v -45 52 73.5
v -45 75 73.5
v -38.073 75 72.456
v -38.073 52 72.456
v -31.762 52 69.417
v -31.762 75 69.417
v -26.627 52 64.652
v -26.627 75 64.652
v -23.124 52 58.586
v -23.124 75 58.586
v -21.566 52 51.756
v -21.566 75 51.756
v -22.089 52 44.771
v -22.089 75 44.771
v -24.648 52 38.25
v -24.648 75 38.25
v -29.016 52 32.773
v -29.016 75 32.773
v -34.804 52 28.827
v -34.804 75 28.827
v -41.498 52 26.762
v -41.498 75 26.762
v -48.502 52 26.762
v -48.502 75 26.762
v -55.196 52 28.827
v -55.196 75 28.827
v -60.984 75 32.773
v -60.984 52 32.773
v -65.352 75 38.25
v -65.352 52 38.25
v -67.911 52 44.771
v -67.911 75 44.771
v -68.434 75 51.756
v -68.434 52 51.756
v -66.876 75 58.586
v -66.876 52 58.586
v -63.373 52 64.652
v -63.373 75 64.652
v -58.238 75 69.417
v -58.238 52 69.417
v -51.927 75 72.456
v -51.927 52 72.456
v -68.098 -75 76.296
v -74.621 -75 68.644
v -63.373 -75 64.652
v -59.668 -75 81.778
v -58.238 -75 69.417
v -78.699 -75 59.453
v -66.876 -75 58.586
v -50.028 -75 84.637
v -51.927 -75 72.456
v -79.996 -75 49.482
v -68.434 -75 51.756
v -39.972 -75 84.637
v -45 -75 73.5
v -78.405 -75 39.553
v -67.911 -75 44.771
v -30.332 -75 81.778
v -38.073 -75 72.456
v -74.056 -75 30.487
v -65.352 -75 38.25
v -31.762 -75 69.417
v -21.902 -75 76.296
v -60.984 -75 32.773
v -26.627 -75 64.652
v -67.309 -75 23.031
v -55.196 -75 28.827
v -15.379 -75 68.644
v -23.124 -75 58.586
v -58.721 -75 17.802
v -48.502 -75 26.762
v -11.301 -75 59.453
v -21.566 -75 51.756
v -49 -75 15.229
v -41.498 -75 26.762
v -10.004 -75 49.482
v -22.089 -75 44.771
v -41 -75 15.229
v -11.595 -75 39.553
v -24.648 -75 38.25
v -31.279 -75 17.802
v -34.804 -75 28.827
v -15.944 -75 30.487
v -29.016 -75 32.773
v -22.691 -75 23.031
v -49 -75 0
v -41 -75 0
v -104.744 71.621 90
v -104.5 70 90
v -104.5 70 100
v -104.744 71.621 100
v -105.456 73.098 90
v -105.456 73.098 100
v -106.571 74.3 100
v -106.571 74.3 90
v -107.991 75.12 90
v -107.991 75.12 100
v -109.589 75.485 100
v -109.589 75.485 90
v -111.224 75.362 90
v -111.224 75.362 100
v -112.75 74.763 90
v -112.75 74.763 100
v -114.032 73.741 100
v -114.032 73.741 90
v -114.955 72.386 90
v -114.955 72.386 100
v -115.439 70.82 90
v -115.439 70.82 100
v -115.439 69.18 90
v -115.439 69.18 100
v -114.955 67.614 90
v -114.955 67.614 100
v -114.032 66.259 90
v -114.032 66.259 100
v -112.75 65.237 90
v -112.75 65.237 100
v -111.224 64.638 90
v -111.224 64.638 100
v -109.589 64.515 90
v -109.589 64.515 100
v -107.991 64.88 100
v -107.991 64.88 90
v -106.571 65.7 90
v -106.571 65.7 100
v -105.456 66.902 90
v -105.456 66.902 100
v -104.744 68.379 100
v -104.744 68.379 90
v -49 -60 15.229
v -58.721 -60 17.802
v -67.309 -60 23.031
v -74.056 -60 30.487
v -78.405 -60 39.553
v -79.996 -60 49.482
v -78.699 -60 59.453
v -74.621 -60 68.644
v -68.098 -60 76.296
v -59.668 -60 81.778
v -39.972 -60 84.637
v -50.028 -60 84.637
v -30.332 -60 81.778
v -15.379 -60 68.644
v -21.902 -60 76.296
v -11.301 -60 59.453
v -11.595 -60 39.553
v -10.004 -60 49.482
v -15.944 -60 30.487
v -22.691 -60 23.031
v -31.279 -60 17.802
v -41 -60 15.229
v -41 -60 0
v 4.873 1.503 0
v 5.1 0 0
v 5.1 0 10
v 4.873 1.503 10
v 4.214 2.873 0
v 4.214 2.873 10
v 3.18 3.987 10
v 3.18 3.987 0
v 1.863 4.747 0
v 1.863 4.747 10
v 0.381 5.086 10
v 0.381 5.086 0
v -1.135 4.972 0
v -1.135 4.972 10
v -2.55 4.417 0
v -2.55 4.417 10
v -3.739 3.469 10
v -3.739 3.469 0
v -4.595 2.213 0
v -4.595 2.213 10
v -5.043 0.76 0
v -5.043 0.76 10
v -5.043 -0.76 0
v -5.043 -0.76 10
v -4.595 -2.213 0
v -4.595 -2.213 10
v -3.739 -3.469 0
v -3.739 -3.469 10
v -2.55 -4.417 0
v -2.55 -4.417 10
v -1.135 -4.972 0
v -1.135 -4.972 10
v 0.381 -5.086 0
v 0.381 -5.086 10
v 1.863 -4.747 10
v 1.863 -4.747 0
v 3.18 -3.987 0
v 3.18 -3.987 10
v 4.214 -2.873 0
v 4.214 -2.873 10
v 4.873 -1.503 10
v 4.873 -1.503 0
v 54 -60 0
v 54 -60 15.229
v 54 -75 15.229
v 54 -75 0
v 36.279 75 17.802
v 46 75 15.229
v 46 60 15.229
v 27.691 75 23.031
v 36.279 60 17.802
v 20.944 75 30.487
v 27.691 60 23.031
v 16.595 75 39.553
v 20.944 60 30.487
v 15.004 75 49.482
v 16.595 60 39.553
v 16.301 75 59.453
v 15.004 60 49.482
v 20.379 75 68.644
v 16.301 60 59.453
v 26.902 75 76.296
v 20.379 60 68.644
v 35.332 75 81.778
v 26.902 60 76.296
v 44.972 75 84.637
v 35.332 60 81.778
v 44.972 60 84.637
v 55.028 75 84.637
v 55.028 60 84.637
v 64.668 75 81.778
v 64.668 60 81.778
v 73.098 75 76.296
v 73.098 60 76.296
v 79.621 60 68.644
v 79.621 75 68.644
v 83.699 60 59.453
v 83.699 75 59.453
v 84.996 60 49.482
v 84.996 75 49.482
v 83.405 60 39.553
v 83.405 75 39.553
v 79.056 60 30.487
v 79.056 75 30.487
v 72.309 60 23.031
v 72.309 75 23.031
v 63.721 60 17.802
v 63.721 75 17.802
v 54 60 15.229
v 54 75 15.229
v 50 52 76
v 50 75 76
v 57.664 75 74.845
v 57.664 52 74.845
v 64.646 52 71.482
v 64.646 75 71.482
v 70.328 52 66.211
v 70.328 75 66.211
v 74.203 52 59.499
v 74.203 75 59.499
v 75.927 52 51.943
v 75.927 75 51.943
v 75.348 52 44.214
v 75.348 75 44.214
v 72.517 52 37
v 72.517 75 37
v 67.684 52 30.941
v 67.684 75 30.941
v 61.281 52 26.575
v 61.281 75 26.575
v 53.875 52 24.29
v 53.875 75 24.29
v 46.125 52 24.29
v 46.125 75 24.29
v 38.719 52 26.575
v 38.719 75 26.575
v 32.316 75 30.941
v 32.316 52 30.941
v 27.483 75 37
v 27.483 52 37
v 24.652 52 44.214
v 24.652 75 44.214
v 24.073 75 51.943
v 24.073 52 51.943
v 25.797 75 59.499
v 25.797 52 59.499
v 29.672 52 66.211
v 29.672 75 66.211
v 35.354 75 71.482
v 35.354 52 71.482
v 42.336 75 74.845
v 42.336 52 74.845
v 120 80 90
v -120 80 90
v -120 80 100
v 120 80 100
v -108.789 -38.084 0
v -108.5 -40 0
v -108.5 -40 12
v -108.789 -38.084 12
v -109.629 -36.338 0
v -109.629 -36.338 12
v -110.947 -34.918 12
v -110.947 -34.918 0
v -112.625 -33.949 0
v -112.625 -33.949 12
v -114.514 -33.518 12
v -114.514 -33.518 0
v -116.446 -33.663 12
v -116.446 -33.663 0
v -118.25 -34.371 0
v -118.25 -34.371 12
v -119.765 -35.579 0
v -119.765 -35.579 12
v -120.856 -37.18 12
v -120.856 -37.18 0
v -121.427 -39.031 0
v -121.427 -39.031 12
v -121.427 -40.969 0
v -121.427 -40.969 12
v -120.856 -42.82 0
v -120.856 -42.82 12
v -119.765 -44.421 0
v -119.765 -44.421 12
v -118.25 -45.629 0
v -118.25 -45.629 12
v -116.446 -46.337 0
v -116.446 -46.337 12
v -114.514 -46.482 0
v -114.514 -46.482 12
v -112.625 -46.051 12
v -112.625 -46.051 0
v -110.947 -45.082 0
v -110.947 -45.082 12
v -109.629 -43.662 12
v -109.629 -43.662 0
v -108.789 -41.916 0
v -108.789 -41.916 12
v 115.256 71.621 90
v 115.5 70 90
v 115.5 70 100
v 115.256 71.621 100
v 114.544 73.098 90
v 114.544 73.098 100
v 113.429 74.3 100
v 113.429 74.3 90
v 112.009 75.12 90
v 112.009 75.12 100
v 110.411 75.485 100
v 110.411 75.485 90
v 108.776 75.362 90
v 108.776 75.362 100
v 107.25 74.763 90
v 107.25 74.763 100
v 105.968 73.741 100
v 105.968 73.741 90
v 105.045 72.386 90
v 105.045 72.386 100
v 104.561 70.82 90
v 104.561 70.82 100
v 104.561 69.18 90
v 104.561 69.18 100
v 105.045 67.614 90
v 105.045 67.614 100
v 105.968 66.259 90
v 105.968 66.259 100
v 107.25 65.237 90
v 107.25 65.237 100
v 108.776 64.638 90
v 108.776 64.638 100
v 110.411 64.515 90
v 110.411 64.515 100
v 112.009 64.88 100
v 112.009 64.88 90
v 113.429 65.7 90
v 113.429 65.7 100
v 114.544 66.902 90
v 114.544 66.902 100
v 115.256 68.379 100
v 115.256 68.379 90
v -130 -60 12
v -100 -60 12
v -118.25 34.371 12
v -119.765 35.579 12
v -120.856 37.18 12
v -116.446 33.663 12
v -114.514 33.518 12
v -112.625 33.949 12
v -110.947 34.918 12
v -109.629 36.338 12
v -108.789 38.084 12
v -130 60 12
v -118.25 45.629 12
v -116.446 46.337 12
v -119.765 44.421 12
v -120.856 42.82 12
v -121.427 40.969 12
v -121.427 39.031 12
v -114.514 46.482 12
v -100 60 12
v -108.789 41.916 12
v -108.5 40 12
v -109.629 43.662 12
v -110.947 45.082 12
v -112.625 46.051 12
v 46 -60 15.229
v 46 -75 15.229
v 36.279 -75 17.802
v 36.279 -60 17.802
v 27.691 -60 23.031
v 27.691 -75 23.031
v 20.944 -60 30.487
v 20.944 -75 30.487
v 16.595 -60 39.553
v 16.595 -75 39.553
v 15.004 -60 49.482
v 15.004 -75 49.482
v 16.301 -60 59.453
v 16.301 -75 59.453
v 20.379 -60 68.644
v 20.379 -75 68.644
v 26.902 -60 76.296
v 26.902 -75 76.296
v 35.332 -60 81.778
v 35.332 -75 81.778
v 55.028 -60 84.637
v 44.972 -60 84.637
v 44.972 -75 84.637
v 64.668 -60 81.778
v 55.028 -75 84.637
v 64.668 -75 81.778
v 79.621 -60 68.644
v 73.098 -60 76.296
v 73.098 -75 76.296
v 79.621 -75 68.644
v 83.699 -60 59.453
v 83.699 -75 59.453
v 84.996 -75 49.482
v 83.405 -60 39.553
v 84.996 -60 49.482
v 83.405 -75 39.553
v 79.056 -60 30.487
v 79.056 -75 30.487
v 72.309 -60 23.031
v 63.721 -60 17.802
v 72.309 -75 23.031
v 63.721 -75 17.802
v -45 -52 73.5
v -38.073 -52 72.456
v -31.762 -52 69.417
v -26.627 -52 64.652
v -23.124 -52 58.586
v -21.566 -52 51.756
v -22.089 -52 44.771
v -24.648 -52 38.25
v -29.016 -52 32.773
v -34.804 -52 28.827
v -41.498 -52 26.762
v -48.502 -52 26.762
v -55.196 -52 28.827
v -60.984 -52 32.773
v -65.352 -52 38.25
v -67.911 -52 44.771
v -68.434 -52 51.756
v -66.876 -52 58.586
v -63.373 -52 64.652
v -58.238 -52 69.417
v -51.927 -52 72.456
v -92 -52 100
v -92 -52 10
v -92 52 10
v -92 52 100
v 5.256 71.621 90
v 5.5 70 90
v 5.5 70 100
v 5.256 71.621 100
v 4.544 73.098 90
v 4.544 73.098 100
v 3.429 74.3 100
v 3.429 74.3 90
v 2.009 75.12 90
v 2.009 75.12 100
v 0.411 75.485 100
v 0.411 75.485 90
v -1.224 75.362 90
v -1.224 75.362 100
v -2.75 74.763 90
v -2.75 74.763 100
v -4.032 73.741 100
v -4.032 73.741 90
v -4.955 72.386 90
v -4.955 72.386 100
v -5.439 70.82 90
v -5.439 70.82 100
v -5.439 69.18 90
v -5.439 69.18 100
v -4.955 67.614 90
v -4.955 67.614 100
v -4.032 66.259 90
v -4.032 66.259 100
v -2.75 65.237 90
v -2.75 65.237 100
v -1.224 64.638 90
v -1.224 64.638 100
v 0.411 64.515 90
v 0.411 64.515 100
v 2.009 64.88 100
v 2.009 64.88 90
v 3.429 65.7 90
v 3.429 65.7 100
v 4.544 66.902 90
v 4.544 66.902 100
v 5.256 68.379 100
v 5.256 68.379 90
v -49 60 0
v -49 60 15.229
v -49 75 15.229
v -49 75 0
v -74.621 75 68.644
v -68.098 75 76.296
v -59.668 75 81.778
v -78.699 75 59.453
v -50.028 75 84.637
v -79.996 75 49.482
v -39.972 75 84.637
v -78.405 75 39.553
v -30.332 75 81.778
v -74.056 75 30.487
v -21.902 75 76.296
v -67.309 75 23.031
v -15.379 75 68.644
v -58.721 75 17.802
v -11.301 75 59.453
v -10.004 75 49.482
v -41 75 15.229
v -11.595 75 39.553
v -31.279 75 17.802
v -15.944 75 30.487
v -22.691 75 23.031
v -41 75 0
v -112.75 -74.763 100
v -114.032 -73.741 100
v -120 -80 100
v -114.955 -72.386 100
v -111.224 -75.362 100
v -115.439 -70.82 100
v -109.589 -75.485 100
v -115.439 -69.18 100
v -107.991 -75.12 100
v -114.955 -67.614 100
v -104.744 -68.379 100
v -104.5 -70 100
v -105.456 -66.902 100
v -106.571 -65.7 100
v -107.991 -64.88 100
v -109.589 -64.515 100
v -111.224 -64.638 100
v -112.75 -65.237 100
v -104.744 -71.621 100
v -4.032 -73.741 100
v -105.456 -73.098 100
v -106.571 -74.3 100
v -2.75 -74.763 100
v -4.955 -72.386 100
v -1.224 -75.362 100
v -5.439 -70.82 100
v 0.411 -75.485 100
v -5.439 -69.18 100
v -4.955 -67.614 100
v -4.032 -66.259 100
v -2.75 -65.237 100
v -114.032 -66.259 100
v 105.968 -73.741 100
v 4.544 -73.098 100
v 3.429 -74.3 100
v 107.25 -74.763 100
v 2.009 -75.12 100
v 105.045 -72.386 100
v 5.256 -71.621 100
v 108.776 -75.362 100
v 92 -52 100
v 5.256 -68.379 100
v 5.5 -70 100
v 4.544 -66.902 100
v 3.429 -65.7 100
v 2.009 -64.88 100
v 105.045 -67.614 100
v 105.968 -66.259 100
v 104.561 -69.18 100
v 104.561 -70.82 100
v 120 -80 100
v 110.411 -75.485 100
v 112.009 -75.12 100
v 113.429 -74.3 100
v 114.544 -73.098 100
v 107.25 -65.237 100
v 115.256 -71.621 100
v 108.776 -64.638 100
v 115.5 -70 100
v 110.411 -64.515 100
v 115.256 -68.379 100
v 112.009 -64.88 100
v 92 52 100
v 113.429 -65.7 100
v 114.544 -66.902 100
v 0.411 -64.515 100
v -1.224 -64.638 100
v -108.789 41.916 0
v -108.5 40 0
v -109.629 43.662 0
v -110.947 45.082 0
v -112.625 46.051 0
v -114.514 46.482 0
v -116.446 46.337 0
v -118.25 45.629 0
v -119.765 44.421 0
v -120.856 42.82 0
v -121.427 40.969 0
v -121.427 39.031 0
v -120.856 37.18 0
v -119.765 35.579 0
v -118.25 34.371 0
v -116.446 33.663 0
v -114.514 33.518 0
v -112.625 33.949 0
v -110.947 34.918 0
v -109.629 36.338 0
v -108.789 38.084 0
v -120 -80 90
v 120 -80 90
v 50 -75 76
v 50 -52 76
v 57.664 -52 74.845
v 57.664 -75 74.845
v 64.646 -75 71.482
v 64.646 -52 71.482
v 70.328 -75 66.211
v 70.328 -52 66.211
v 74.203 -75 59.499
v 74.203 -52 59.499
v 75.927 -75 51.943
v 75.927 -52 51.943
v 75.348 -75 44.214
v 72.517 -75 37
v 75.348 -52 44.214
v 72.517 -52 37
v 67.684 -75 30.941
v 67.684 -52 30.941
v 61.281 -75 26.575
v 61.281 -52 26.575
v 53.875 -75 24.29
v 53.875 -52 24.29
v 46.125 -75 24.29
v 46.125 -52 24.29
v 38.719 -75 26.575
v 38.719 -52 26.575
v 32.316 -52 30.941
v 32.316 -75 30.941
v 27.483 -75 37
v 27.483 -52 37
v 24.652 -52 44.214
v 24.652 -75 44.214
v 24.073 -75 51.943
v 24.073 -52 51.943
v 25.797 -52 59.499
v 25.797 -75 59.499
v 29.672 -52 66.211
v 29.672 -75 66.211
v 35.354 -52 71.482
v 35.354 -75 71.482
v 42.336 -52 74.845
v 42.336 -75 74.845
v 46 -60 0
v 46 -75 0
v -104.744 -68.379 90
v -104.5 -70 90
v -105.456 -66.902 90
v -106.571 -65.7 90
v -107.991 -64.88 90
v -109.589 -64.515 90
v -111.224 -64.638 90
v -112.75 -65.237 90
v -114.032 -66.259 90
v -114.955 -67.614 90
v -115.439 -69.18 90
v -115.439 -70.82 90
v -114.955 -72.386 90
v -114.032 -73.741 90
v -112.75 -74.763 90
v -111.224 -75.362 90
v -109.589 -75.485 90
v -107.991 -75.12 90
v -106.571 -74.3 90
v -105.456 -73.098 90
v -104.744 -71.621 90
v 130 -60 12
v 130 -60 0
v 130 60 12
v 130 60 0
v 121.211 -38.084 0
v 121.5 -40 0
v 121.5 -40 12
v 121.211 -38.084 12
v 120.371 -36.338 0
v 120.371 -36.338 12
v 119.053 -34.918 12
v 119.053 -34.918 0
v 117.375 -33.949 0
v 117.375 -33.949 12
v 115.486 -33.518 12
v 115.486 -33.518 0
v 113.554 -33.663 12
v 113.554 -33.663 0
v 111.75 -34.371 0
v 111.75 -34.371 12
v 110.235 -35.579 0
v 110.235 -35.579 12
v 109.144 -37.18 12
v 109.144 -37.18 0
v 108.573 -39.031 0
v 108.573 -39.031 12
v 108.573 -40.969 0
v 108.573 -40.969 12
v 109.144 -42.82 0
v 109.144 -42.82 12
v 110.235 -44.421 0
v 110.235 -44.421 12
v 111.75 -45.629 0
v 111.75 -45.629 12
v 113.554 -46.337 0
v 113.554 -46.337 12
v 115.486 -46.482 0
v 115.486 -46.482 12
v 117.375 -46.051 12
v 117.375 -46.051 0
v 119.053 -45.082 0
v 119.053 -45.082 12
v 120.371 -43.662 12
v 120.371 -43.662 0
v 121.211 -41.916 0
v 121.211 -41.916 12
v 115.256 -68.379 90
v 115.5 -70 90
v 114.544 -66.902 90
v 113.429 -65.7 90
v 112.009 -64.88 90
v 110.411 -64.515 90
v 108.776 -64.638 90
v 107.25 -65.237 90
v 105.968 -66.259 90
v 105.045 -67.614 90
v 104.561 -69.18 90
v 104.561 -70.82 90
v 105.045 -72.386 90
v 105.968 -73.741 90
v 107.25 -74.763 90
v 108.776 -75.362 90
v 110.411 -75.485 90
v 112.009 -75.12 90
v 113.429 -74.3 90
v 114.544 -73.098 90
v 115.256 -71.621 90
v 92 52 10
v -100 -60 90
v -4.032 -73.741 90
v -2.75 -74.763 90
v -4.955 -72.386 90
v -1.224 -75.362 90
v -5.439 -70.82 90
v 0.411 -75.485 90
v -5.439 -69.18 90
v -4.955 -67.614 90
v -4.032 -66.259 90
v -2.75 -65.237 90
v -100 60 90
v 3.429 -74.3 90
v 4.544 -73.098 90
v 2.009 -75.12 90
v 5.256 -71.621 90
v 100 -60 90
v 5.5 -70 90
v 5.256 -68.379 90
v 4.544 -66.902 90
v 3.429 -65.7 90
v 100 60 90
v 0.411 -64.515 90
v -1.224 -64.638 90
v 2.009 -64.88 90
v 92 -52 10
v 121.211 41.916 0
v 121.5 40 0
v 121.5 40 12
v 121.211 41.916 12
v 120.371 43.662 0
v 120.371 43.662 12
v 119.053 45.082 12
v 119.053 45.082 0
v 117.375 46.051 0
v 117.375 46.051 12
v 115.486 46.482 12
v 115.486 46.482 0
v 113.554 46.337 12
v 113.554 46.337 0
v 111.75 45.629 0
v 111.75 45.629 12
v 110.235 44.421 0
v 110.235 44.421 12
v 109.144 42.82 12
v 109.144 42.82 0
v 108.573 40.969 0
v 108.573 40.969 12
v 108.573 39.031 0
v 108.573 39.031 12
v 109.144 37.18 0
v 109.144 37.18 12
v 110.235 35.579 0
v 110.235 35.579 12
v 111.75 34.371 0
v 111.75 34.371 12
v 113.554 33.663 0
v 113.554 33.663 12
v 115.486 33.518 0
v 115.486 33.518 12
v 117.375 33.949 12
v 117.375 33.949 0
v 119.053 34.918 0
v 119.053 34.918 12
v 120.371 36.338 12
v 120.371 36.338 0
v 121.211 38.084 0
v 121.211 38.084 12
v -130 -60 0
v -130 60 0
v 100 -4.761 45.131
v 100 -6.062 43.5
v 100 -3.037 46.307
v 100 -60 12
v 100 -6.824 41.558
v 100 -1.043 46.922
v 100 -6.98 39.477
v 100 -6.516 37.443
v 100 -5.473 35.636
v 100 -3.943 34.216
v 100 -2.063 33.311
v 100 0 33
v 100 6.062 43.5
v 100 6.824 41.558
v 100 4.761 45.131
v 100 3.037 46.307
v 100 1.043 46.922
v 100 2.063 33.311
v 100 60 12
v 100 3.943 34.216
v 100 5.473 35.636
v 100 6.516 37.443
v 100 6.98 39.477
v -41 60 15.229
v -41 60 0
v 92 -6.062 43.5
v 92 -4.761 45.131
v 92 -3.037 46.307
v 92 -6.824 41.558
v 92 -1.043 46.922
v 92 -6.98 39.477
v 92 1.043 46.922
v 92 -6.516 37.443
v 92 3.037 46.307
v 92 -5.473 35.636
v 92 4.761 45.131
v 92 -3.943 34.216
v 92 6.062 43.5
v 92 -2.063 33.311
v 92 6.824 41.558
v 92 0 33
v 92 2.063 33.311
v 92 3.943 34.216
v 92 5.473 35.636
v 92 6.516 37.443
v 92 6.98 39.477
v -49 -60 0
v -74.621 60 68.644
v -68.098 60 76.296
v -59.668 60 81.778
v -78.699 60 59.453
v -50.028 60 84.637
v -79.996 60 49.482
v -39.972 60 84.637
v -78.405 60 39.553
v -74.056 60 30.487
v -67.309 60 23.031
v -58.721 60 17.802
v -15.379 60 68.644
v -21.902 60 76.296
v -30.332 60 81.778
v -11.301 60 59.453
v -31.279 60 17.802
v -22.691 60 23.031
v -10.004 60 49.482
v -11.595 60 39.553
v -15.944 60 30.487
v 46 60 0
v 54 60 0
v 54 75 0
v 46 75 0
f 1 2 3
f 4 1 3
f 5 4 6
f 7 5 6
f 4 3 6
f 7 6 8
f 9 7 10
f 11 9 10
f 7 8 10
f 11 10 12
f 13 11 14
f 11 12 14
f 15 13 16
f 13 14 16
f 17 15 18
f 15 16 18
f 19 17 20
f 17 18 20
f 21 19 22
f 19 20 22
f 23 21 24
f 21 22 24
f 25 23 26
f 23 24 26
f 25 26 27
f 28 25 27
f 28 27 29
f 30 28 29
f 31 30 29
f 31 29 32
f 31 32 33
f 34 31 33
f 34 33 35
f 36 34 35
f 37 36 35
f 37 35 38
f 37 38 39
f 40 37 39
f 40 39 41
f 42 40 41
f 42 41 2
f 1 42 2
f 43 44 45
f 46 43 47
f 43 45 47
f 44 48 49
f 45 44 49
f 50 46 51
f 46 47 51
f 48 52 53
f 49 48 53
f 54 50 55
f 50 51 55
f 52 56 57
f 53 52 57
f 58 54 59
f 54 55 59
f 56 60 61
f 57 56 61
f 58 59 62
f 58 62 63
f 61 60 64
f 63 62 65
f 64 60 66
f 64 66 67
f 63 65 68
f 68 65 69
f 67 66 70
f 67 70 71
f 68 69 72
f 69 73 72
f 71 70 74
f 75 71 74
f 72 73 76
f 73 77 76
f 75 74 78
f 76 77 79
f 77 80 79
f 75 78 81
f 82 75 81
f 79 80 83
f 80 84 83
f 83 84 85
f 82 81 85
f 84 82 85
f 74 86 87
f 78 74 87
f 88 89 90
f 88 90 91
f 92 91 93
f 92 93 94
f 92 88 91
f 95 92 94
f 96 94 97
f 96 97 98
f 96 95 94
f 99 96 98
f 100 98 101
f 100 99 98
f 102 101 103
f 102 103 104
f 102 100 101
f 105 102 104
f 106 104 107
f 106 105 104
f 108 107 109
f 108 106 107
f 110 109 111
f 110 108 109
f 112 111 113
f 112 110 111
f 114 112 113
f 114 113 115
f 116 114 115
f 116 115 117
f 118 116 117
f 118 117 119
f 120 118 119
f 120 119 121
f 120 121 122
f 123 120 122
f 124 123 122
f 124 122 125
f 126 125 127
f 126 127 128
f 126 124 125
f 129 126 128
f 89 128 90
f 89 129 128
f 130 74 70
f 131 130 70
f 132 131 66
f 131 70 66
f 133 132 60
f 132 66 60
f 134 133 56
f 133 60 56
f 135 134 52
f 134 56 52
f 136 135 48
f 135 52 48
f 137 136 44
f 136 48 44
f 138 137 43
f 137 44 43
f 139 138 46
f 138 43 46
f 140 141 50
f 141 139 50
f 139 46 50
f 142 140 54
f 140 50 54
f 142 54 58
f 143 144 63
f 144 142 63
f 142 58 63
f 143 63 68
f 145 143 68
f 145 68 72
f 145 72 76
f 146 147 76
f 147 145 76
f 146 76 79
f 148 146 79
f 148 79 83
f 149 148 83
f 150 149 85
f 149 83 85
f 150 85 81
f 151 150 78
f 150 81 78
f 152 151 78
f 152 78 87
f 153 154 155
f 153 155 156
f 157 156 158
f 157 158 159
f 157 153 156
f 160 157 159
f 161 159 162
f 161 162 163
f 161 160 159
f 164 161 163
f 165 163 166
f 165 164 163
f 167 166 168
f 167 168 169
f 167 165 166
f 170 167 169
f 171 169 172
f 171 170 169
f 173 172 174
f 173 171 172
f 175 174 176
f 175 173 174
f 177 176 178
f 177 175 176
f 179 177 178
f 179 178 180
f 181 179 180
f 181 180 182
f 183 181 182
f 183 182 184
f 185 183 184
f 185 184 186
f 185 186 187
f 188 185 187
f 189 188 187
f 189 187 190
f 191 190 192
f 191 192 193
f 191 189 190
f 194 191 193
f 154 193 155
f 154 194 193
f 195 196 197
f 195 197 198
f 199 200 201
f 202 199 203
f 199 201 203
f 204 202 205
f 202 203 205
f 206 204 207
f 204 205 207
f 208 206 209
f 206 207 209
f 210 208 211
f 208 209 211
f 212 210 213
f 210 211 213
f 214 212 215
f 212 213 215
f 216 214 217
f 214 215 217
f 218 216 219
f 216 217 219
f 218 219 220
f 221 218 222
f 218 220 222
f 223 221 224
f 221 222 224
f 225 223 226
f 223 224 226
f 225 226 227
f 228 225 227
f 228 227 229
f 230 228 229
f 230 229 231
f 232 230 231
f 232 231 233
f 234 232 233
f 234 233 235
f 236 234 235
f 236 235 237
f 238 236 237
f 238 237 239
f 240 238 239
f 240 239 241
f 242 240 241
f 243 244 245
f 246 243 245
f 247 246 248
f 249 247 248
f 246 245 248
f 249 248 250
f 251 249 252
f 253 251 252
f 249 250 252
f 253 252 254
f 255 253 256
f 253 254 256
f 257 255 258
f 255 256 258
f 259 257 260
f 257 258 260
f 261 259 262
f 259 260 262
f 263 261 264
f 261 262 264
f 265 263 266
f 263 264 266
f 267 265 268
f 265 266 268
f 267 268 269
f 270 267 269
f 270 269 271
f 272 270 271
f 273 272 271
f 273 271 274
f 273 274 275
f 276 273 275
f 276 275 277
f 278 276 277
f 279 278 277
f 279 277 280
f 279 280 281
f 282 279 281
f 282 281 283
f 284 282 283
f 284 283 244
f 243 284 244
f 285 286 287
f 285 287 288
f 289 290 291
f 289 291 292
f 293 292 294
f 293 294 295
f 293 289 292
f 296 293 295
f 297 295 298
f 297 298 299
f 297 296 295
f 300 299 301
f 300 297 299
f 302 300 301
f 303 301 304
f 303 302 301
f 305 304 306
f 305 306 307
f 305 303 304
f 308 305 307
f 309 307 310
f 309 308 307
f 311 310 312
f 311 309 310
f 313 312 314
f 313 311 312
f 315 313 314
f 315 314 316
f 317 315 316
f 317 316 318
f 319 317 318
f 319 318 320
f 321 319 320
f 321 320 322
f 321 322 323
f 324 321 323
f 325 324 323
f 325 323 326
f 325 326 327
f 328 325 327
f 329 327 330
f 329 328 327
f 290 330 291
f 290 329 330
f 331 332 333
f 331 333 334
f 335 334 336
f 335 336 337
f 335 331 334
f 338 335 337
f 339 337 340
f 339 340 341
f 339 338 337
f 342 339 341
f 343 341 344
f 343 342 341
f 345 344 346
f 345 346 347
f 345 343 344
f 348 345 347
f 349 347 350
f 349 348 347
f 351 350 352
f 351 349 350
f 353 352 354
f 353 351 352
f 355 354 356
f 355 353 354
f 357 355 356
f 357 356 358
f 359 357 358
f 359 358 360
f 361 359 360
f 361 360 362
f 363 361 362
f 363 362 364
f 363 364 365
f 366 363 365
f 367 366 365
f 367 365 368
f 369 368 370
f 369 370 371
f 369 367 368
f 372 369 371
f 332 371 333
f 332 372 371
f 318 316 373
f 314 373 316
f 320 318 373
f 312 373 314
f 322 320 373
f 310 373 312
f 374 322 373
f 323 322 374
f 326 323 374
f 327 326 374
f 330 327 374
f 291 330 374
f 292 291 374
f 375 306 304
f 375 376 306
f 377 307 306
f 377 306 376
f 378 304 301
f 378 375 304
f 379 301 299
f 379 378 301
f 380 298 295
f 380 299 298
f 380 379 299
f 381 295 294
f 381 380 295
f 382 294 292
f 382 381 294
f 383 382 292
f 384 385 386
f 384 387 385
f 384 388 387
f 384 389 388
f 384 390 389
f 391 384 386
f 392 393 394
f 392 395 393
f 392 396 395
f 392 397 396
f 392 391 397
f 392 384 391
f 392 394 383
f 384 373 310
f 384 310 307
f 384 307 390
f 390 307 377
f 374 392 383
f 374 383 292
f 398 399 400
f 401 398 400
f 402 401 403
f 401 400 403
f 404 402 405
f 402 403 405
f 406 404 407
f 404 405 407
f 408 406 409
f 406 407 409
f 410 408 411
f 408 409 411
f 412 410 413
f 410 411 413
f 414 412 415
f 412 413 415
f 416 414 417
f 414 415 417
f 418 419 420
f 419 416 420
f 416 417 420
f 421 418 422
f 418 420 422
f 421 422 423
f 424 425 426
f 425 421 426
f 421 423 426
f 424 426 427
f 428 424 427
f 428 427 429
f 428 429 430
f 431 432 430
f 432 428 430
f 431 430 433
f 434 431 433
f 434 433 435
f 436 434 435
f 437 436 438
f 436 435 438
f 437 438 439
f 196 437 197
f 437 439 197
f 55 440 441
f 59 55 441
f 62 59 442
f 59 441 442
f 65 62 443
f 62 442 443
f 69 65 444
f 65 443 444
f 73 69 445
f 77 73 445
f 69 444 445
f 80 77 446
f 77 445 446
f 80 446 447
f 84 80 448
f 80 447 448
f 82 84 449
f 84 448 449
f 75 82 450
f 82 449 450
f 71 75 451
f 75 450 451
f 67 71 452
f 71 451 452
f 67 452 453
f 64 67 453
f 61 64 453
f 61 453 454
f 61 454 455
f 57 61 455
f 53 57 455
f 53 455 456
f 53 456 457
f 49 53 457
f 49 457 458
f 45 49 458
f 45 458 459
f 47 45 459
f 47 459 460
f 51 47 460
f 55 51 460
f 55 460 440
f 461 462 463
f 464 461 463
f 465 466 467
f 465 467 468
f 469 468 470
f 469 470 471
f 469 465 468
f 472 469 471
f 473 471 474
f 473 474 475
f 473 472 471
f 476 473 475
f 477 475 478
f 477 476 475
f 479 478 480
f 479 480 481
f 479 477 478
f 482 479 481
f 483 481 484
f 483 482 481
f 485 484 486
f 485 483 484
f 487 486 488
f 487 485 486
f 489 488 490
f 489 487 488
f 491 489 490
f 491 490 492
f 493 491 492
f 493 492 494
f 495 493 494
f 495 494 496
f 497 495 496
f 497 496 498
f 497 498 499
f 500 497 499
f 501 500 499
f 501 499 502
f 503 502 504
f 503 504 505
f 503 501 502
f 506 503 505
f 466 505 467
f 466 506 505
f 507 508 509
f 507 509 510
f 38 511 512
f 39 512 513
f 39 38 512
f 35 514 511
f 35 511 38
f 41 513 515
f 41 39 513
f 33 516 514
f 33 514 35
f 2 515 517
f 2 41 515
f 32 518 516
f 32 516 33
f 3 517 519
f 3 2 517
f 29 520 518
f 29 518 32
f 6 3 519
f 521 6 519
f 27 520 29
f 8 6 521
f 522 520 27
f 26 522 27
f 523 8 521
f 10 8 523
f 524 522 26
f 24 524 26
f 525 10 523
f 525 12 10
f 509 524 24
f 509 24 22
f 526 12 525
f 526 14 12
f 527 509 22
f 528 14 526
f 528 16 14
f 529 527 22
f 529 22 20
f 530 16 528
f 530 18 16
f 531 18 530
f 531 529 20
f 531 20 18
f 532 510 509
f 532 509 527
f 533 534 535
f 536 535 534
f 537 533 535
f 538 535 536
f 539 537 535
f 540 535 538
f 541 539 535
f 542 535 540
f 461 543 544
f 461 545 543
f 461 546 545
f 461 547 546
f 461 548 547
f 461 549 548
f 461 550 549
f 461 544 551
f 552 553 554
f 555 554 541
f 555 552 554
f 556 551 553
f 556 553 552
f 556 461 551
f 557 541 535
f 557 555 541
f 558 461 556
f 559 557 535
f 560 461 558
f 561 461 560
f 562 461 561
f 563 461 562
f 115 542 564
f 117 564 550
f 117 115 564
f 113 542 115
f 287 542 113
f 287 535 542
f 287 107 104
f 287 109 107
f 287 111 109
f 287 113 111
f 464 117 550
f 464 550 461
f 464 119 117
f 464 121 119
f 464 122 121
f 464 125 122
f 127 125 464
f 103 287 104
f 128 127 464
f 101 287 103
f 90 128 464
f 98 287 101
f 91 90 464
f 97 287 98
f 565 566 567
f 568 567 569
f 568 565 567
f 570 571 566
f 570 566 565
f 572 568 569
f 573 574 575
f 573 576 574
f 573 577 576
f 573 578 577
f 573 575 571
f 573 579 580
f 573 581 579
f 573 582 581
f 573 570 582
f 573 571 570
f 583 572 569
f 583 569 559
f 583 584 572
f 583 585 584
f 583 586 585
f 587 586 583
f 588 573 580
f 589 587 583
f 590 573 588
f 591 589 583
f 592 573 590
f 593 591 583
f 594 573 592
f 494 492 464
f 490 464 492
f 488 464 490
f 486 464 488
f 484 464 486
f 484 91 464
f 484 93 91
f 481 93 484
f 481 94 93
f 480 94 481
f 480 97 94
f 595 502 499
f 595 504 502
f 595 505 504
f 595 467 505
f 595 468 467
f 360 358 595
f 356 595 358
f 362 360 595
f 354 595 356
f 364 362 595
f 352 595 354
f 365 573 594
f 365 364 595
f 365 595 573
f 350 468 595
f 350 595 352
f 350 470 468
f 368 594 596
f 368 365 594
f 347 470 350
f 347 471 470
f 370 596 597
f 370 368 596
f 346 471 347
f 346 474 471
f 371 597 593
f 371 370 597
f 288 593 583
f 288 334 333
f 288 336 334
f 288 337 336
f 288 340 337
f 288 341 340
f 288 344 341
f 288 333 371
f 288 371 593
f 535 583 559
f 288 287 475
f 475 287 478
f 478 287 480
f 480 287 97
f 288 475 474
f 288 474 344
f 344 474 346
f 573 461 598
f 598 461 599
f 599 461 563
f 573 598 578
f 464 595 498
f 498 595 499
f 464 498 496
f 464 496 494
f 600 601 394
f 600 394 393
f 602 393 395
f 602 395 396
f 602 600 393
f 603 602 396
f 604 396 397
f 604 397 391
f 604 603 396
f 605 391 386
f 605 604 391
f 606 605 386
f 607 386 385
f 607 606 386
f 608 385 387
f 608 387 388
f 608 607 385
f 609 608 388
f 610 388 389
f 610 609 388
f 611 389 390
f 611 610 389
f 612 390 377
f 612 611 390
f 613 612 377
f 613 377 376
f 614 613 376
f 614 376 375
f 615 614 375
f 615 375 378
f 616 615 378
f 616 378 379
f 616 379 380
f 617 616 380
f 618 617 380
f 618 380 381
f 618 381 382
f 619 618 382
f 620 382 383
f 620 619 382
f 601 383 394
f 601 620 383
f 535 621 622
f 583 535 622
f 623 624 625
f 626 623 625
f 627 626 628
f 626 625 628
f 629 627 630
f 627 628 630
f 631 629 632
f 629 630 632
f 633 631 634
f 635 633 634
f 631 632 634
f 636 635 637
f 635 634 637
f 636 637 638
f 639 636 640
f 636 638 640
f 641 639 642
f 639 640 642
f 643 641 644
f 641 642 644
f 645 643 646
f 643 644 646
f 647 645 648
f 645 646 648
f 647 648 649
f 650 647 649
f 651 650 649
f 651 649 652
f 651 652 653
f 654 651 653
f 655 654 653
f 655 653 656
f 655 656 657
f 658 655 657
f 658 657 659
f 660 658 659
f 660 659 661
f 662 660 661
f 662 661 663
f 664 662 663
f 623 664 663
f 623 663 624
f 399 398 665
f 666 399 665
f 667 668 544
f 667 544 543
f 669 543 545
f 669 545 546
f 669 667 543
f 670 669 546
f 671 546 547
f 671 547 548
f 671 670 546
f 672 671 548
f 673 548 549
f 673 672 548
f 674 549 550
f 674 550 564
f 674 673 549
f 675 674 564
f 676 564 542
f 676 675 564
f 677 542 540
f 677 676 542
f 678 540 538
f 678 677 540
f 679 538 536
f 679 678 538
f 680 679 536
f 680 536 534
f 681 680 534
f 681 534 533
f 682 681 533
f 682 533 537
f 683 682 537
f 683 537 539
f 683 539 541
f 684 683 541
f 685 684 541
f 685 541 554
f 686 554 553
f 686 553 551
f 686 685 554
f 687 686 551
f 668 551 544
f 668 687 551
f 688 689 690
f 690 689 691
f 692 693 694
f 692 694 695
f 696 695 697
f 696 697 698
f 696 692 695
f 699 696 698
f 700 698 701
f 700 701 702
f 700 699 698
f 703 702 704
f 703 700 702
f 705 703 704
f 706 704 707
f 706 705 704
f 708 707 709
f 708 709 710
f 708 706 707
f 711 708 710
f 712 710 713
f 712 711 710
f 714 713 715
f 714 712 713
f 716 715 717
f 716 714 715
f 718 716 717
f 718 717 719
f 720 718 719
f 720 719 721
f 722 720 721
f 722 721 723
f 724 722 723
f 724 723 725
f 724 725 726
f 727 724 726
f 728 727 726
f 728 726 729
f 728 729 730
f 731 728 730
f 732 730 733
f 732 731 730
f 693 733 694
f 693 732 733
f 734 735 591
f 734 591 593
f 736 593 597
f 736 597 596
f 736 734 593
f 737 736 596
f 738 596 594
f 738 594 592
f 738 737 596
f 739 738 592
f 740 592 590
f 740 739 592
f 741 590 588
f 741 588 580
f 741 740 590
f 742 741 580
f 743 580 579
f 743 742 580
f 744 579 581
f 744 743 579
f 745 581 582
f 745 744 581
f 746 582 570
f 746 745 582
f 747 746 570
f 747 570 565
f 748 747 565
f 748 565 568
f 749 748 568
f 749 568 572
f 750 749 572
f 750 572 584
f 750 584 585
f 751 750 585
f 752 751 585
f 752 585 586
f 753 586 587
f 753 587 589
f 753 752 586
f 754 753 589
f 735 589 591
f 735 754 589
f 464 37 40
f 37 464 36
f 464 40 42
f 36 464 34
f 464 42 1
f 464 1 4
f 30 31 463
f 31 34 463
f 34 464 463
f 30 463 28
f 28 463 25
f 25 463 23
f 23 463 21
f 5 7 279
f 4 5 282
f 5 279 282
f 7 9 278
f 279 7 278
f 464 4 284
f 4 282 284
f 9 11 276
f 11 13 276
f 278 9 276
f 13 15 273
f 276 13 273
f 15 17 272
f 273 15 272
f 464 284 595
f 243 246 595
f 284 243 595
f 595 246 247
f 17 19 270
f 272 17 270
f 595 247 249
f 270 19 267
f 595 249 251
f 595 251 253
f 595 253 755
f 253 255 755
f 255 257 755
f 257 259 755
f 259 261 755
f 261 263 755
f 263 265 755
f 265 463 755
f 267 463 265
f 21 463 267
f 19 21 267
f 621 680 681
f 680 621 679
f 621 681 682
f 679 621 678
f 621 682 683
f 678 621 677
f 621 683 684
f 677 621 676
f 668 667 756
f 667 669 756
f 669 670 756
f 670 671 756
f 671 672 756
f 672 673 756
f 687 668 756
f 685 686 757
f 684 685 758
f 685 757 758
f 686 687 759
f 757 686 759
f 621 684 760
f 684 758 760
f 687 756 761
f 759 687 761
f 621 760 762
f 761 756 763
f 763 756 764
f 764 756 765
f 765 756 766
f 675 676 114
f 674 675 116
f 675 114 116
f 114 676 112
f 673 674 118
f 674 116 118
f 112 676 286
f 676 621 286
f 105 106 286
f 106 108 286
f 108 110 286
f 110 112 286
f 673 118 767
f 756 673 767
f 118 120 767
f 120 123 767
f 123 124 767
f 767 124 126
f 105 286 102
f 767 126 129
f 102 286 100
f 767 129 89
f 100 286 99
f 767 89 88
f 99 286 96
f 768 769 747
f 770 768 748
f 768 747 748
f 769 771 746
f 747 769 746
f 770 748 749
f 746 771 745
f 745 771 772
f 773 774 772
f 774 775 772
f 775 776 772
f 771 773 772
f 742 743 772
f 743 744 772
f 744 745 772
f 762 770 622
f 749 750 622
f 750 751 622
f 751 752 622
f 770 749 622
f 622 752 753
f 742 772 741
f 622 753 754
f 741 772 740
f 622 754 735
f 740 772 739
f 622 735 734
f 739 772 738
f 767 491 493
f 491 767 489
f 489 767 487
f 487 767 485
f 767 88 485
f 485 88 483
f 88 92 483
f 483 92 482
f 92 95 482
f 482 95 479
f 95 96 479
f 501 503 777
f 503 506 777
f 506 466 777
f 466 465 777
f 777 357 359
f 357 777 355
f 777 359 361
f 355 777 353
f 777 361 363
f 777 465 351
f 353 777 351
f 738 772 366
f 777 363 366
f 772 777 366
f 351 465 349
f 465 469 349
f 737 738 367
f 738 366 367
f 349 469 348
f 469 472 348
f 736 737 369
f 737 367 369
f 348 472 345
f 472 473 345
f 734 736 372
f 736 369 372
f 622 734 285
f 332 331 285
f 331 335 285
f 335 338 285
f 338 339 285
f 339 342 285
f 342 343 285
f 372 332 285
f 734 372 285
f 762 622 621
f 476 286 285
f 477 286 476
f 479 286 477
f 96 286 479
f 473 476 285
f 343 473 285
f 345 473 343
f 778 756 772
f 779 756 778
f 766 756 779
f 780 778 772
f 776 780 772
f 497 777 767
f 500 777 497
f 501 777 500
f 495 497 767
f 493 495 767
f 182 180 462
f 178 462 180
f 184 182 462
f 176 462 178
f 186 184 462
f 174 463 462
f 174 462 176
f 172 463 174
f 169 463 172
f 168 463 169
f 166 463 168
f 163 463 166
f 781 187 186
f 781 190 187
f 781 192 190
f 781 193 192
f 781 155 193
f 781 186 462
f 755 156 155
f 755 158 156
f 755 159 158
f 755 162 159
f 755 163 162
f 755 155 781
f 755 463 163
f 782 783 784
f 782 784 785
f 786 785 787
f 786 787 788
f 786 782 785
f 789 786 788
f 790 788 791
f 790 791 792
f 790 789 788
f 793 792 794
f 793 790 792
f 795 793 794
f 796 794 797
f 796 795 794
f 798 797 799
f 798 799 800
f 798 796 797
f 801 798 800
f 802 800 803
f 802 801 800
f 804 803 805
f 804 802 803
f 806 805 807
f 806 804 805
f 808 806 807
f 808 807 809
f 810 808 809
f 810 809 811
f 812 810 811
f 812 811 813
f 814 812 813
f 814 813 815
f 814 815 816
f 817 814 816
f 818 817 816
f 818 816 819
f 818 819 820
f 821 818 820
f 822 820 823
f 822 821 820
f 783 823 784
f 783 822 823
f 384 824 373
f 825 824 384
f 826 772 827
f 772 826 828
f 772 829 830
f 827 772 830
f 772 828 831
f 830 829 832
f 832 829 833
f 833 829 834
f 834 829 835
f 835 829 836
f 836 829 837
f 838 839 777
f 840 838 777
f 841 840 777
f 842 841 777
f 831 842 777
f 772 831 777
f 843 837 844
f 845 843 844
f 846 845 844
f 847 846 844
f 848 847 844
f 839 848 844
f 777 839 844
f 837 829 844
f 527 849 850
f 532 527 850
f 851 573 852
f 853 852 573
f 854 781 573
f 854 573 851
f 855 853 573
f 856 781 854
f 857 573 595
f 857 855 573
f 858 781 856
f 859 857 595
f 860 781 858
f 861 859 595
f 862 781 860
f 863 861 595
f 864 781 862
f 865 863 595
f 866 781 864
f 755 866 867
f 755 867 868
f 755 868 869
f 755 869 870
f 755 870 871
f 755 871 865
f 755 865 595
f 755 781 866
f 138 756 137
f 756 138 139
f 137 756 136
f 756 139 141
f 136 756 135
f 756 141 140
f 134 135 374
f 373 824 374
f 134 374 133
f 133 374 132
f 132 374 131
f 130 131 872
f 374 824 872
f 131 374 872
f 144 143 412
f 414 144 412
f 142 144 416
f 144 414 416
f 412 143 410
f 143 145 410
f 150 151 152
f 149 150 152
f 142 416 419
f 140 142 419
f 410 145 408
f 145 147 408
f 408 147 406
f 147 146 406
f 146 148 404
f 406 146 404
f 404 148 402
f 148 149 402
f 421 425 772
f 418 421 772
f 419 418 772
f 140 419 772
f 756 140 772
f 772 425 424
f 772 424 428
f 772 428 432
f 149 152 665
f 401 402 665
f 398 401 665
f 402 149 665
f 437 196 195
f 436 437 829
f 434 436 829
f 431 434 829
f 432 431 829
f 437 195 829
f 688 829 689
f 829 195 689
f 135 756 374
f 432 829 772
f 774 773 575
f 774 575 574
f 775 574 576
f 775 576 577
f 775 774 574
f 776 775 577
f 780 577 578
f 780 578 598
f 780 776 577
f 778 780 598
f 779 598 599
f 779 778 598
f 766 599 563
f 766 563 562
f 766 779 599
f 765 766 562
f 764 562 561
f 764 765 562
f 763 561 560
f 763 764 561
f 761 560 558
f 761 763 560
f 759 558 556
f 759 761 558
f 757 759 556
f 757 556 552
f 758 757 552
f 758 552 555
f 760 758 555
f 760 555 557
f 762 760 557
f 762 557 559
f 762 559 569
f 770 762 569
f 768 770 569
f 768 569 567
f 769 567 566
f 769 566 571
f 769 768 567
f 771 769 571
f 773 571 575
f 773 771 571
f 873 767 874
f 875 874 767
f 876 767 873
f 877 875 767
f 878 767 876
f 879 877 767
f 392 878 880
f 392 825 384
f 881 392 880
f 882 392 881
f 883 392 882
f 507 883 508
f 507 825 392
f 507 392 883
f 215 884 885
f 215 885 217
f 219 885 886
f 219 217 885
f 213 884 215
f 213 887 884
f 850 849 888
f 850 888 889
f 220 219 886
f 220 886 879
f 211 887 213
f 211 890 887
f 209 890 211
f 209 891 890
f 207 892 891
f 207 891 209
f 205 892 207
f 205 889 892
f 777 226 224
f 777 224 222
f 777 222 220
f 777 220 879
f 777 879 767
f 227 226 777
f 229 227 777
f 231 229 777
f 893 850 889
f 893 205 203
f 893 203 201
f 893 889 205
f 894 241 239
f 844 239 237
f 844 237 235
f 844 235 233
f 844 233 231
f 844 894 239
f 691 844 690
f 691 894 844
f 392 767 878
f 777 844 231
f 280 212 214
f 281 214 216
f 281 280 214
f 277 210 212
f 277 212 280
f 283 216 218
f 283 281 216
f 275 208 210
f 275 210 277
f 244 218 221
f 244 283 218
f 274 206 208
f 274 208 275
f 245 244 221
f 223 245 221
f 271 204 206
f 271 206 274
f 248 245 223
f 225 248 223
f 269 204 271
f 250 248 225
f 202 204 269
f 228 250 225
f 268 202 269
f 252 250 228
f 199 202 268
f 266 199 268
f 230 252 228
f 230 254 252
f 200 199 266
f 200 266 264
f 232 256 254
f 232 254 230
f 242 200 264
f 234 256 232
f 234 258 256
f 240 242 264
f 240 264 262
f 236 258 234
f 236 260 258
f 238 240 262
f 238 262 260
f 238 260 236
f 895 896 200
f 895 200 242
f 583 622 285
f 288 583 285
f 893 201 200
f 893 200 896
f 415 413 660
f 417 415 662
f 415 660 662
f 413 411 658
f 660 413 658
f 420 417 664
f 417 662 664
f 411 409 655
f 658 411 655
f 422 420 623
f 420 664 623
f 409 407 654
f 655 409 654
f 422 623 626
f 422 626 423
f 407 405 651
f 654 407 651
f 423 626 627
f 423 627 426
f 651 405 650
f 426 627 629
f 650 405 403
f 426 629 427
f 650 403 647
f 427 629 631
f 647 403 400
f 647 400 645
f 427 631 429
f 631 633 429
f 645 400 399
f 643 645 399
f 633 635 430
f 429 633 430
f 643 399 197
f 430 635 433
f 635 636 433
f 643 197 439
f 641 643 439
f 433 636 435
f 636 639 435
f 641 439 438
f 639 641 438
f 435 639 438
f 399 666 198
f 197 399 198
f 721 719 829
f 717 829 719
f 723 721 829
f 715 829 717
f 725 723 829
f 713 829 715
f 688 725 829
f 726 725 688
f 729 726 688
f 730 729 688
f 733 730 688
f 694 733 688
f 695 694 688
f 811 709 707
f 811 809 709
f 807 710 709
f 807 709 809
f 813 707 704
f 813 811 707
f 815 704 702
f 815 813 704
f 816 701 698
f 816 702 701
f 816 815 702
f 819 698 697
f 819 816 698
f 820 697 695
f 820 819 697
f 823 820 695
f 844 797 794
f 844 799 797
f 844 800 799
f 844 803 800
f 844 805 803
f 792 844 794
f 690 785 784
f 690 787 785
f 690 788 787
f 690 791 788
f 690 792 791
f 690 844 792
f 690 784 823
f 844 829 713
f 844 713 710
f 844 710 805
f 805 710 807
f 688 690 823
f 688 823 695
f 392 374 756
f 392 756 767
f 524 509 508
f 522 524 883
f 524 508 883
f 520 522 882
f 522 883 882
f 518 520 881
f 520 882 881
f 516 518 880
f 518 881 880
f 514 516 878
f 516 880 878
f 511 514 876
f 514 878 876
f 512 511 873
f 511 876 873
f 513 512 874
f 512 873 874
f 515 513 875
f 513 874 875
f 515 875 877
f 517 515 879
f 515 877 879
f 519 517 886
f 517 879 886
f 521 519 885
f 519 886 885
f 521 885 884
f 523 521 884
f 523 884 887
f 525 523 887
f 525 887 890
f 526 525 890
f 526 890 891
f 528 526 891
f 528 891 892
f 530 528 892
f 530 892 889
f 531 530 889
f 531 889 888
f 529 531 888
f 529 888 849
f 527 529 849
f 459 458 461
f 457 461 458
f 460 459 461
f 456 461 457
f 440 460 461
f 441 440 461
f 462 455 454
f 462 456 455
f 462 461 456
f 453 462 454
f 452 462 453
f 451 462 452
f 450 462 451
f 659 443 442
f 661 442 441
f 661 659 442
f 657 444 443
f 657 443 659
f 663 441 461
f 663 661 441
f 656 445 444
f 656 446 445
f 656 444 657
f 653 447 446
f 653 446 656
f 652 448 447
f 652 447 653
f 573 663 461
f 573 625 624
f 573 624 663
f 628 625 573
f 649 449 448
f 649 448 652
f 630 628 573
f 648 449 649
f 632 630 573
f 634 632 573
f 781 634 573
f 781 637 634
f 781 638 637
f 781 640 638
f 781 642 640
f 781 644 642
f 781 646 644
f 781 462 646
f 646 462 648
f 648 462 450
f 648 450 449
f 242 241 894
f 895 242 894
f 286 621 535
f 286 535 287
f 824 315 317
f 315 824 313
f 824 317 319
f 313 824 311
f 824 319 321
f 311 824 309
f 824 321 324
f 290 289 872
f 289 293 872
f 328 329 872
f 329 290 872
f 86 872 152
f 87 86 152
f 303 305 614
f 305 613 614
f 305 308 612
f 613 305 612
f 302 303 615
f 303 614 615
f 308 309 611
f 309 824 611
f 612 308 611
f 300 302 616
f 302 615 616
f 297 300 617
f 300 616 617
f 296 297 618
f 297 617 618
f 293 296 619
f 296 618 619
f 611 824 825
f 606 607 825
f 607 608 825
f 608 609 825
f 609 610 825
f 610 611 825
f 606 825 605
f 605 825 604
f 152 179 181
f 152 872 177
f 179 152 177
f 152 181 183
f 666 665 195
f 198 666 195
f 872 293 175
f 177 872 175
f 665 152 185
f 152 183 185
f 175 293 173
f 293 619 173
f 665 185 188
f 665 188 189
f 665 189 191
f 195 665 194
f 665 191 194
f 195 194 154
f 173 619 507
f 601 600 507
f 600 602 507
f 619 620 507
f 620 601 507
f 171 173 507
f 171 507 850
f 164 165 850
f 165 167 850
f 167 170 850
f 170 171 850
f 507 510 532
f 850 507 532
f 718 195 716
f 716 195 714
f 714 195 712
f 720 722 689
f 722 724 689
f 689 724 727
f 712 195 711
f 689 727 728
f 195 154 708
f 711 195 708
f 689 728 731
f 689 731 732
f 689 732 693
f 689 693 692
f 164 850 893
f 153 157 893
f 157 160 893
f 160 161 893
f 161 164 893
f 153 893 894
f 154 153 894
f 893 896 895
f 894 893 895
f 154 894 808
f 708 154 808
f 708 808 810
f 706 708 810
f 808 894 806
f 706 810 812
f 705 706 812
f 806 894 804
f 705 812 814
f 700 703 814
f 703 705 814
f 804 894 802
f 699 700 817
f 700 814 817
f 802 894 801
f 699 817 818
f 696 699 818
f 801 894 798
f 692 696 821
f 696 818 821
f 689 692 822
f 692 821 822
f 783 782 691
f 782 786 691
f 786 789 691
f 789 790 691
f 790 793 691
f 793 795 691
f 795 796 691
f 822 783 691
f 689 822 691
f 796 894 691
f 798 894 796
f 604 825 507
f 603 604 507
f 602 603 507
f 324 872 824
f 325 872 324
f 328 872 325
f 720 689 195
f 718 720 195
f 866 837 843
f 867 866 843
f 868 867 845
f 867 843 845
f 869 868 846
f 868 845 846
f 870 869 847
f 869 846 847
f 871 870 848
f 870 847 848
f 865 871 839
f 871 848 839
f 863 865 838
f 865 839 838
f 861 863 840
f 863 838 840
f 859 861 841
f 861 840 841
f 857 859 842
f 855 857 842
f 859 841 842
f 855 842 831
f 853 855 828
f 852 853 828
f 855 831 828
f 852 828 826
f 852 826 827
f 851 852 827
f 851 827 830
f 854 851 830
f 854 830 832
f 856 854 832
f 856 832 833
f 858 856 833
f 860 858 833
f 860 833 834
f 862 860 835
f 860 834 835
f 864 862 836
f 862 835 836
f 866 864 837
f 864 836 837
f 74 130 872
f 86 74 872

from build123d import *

# Parameters (mm, degrees)
SKETCH_1_W          = 200
SKETCH_1_H          = 120
EXTRUDE_1_DEPTH     = 100
SKETCH_2_W          = 184
SKETCH_2_H          = 104
CUT_EXTRUDE_1_DEPTH = 90
SKETCH_3_R          = 35
EXTRUDE_2_DEPTH     = 20
EXTRUDE_START       = -20
SKETCH_4_R          = 35
EXTRUDE_3_DEPTH     = 20
SKETCH_5_W          = 8
SKETCH_5_H          = 25
EXTRUDE_4_DEPTH     = 20
SKETCH_6_W          = 8
SKETCH_6_H          = 25
EXTRUDE_5_DEPTH     = 20
SKETCH_7_W          = 30
SKETCH_7_H          = 120
EXTRUDE_6_DEPTH     = 12
SKETCH_8_W          = 240
SKETCH_8_H          = 160
SKETCH_8_W_2        = 184
SKETCH_8_H_2        = 104
EXTRUDE_7_DEPTH     = 10
SKETCH_9_R          = 5.5
CUT_EXTRUDE_2_DEPTH = 10
SKETCH_10_R         = 23.5
CUT_EXTRUDE_3_DEPTH = 226.665681928
SKETCH_11_R         = 26
CUT_EXTRUDE_4_DEPTH = 226.665681928
SKETCH_12_R         = 5.1
CUT_EXTRUDE_5_DEPTH = 10
SKETCH_14_R         = 6.5
CUT_EXTRUDE_7_DEPTH = 12
SKETCH_15_R         = 7
CUT_EXTRUDE_8_DEPTH = 8


with BuildPart() as part:
    # 草图1 → 凸台-拉伸1 (new body)
    with BuildSketch(Plane.XY):
        Rectangle(SKETCH_1_W, SKETCH_1_H)
    extrude(amount=EXTRUDE_1_DEPTH)

    # 草图2 → 切除-拉伸1 (cut)
    with BuildSketch(Plane.XY.offset(10)):
        Rectangle(SKETCH_2_W, SKETCH_2_H)
    extrude(amount=CUT_EXTRUDE_1_DEPTH, mode=Mode.SUBTRACT)

    # 草图3 → 凸台-拉伸2 (add)
    with BuildSketch(Plane(origin=(0, 55, 0), x_dir=(1, 0, 0), z_dir=(0, 1, 0))):
        with Locations(Location((-45, -50, 0), (0, 0, 90))):
            Circle(SKETCH_3_R)
        with Locations(Location((50, -50, 0), (0, 0, 90))):
            Circle(SKETCH_3_R)
    extrude(amount=EXTRUDE_2_DEPTH)

    # 草图4 → 凸台-拉伸3 (add)
    with BuildSketch(Plane(origin=(0, -55, 0), x_dir=(1, 0, 0), z_dir=(0, 1, 0)).offset(EXTRUDE_START)):
        with Locations(Location((-45, -50, 0), (0, 0, 90))):
            Circle(SKETCH_4_R)
        with Locations(Location((50, -50, 0), (0, 0, 90))):
            Circle(SKETCH_4_R)
    extrude(amount=EXTRUDE_3_DEPTH)

    # 草图5 → 凸台-拉伸4 (add)
    with BuildSketch(Plane(origin=(0, 55, 0), x_dir=(1, 0, 0), z_dir=(0, 1, 0))):
        with Locations((-45, -12.5)):
            Rectangle(SKETCH_5_W, SKETCH_5_H)
        with Locations((50, -12.5)):
            Rectangle(SKETCH_5_W, SKETCH_5_H)
    extrude(amount=EXTRUDE_4_DEPTH)

    # 草图6 → 凸台-拉伸5 (add)
    with BuildSketch(Plane(origin=(0, -55, 0), x_dir=(1, 0, 0), z_dir=(0, 1, 0))):
        with Locations((-45, -12.5)):
            Rectangle(SKETCH_6_W, SKETCH_6_H)
        with Locations((50, -12.5)):
            Rectangle(SKETCH_6_W, SKETCH_6_H)
    extrude(amount=-EXTRUDE_5_DEPTH)

    # 草图7 → 凸台-拉伸6 (add)
    with BuildSketch(Plane.XY):
        with Locations((115, 0)):
            Rectangle(SKETCH_7_W, SKETCH_7_H)
        with Locations((-115, 0)):
            Rectangle(SKETCH_7_W, SKETCH_7_H)
    extrude(amount=EXTRUDE_6_DEPTH)

    # 草图8 → 凸台-拉伸7 (add)
    with BuildSketch(Plane.XY.offset(90)):
        Rectangle(SKETCH_8_W, SKETCH_8_H)
        Rectangle(SKETCH_8_W_2, SKETCH_8_H_2, mode=Mode.SUBTRACT)
    extrude(amount=EXTRUDE_7_DEPTH)

    # 草图9 → 切除-拉伸2 (cut)
    with BuildSketch(Plane.XY.offset(90)):
        with Locations((-110, 70)):
            Circle(SKETCH_9_R)
        with Locations((110, 70)):
            Circle(SKETCH_9_R)
        with Locations((-110, -70)):
            Circle(SKETCH_9_R)
        with Locations((110, -70)):
            Circle(SKETCH_9_R)
        with Locations((0, 70)):
            Circle(SKETCH_9_R)
        with Locations((0, -70)):
            Circle(SKETCH_9_R)
    extrude(amount=CUT_EXTRUDE_2_DEPTH, mode=Mode.SUBTRACT)

    # 草图10 → 切除-拉伸3 (cut, through all)
    with BuildSketch(Plane(origin=(0, 75, 0), x_dir=(1, 0, 0), z_dir=(0, 1, 0))):
        with Locations(Location((-45, -50, 0), (0, 0, 270))):
            Circle(SKETCH_10_R)
    extrude(amount=-CUT_EXTRUDE_3_DEPTH, mode=Mode.SUBTRACT)

    # 草图11 → 切除-拉伸4 (cut, through all)
    with BuildSketch(Plane(origin=(0, 75, 0), x_dir=(1, 0, 0), z_dir=(0, 1, 0))):
        with Locations(Location((50, -50, 0), (0, 0, 270))):
            Circle(SKETCH_11_R)
    extrude(amount=-CUT_EXTRUDE_4_DEPTH, mode=Mode.SUBTRACT)

    # 草图12 → 切除-拉伸5 (cut)
    with BuildSketch(Plane.XY):
        Circle(SKETCH_12_R)
    extrude(amount=CUT_EXTRUDE_5_DEPTH, mode=Mode.SUBTRACT)

    # 草图14 → 切除-拉伸7 (cut)
    with BuildSketch(Plane.XY):
        with Locations((115, 40)):
            Circle(SKETCH_14_R)
        with Locations((115, -40)):
            Circle(SKETCH_14_R)
        with Locations((-115, 40)):
            Circle(SKETCH_14_R)
        with Locations((-115, -40)):
            Circle(SKETCH_14_R)
    extrude(amount=CUT_EXTRUDE_7_DEPTH, mode=Mode.SUBTRACT)

    # 草图15 → 切除-拉伸8 (cut)
    with BuildSketch(Plane(origin=(100, 0, 0), x_dir=(0, 0, -1), z_dir=(1, 0, 0))):
        with Locations((-40, 0)):
            Circle(SKETCH_15_R)
    extrude(amount=-CUT_EXTRUDE_8_DEPTH, mode=Mode.SUBTRACT)


solid = part.part
